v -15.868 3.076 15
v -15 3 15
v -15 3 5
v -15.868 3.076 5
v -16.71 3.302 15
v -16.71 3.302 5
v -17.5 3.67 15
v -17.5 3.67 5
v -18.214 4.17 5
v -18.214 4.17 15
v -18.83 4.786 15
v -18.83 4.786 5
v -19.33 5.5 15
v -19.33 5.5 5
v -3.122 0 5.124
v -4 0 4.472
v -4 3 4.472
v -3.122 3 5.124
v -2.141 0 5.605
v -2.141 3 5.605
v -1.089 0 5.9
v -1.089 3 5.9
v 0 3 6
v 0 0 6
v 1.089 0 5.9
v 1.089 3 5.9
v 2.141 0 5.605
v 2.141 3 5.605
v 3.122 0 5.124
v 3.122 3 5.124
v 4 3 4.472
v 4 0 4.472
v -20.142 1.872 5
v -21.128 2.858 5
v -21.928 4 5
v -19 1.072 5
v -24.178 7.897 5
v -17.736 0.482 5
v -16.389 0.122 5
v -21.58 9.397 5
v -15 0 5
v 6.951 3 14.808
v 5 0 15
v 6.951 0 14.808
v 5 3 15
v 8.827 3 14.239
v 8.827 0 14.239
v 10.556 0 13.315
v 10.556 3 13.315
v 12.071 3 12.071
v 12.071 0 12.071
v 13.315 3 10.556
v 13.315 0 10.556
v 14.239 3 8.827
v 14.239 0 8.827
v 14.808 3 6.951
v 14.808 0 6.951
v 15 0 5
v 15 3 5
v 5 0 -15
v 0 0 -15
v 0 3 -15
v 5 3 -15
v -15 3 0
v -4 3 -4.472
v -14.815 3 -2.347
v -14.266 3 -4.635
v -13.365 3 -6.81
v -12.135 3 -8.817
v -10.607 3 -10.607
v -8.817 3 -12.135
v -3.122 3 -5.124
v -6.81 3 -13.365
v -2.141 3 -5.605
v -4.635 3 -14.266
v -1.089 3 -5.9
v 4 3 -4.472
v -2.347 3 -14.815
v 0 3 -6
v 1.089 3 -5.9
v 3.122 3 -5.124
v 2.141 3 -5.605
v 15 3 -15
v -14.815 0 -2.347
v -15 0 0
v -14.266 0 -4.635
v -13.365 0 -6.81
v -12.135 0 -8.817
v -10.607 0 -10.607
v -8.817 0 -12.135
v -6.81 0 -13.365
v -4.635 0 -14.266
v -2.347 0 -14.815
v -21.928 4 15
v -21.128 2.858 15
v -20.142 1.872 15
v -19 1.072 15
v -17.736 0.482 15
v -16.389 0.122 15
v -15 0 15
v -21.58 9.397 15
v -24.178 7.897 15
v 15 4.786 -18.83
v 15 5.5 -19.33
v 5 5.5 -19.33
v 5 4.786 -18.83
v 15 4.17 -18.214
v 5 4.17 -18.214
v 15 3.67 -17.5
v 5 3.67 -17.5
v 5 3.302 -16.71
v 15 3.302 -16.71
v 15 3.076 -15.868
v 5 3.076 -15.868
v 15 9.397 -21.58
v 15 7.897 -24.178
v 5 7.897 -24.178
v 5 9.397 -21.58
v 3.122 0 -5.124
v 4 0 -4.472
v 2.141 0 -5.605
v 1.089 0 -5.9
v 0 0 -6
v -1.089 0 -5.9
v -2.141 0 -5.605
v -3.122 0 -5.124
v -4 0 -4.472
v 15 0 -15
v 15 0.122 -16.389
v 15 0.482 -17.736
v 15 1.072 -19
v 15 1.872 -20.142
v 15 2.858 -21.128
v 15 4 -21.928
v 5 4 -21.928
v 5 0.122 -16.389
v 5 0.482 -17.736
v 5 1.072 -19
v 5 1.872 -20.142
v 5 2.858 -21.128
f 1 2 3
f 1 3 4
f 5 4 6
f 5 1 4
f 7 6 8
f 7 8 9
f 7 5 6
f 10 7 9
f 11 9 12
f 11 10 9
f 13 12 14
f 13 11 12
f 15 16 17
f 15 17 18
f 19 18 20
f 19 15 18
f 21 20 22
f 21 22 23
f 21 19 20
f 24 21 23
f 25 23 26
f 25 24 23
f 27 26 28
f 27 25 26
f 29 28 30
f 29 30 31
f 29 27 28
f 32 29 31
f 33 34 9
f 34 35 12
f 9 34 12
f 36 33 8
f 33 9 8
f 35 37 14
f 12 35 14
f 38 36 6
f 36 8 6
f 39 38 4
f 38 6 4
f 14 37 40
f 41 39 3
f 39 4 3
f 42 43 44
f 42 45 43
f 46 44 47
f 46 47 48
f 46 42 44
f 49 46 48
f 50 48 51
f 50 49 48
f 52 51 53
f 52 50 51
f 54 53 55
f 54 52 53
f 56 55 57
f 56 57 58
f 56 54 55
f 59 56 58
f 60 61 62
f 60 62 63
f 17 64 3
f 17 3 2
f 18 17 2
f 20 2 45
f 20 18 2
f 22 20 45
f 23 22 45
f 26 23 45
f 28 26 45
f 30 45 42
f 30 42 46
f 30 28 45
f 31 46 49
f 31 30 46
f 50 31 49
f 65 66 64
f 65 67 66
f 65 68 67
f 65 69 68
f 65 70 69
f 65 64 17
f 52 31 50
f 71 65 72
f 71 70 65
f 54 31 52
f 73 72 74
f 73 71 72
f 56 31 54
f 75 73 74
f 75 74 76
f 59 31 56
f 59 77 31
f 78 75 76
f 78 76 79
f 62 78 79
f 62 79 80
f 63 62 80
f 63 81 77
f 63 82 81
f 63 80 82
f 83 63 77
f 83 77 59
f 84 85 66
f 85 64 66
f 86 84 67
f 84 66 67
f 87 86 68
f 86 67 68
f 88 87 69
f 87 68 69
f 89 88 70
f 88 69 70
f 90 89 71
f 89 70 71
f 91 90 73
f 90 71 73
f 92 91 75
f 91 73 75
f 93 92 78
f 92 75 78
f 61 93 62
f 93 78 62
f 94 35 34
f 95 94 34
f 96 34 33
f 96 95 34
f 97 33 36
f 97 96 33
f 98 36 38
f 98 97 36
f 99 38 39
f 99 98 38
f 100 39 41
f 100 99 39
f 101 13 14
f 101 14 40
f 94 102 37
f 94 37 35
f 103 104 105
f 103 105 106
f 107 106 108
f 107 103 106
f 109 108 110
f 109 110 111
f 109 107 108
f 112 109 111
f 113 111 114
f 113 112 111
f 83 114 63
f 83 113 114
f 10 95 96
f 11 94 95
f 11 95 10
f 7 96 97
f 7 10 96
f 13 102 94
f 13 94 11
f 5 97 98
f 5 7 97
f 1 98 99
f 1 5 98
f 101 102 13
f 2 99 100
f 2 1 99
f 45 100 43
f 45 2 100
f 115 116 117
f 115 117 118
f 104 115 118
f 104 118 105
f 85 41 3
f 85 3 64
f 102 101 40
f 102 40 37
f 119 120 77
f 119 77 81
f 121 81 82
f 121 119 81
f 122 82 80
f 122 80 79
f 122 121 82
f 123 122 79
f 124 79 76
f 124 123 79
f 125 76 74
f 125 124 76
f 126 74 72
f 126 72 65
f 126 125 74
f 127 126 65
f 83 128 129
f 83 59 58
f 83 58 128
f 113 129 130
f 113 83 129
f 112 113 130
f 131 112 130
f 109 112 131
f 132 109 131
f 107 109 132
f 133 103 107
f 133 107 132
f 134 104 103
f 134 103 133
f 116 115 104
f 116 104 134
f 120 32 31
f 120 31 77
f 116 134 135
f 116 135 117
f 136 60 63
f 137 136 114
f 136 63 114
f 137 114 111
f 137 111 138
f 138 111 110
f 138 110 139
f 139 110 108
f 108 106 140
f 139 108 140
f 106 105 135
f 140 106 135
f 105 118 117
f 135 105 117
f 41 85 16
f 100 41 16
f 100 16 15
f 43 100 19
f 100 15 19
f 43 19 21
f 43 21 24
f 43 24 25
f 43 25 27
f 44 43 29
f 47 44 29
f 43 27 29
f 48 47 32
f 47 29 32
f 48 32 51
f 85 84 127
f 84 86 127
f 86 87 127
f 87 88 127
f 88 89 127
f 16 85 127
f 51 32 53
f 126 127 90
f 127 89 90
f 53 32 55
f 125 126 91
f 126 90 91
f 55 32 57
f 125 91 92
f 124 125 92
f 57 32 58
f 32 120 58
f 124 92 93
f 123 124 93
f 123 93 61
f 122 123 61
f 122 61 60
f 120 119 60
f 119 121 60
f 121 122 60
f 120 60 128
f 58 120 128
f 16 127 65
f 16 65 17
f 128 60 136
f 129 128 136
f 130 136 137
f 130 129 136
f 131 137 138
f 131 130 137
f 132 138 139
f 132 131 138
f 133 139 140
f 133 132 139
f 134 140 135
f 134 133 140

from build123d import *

# Parameters (mm, degrees)
SKETCH1_W           = 30
SKETCH1_H           = 30
BOSS_EXTRUDE1_DEPTH = 3
BOSS_EXTRUDE2_DEPTH = 10
FILLET1_R           = 15
FILLET2_R           = 10
BOSS_EXTRUDE3_DEPTH = 10
CUT_EXTRUDE1_DEPTH  = 3


with BuildPart() as part:
    # Sketch1 → Boss-Extrude1 (new body)
    with BuildSketch(Plane(origin=(0, 0, 0), x_dir=(1, 0, 0), z_dir=(0, 1, 0))):
        Rectangle(SKETCH1_W, SKETCH1_H)
    extrude(amount=BOSS_EXTRUDE1_DEPTH)

    # Sketch2 → Boss-Extrude2 (add)
    with BuildSketch(Plane.XY.offset(15)):
        with BuildLine():
            Line((-21.580127019, 9.397114317), (-24.17820323, 7.897114317))
            Line((-24.17820323, 7.897114317), (-21.92820323, 4))
            ThreePointArc((-21.92820323, 4), (-19, 1.07179677), (-15, 0))
            Line((-15, 0), (-15, 3))
            ThreePointArc((-15, 3), (-17.5, 3.669872981), (-19.330127019, 5.5))
            Line((-19.330127019, 5.5), (-21.580127019, 9.397114317))
        make_face()
    extrude(amount=-BOSS_EXTRUDE2_DEPTH)

    # Fillet1
    fillet1_edges = [part.edges().sort_by_distance(p)[0] for p in [
        (-15, 1.5, -15),
    ]]
    fillet(fillet1_edges, radius=FILLET1_R)

    # Fillet2
    fillet2_edges = [part.edges().sort_by_distance(p)[0] for p in [
        (15, 1.5, 15),
    ]]
    fillet(fillet2_edges, radius=FILLET2_R)

    # Sketch3 → Boss-Extrude3 (add)
    with BuildSketch(Plane(origin=(15, 0, 0), x_dir=(0, 0, -1), z_dir=(1, 0, 0))):
        with BuildLine():
            Line((15, 3), (15, 0))
            ThreePointArc((15, 0), (19, 1.07179677), (21.92820323, 4))
            Line((21.92820323, 4), (24.17820323, 7.897114317))
            Line((24.17820323, 7.897114317), (21.580127019, 9.397114317))
            Line((21.580127019, 9.397114317), (19.330127019, 5.5))
            ThreePointArc((19.330127019, 5.5), (17.5, 3.669872981), (15, 3))
        make_face()
    extrude(amount=-BOSS_EXTRUDE3_DEPTH)

    # Sketch4 → Cut-Extrude1 (cut)
    with BuildSketch(Plane.XZ):
        with BuildLine():
            Line((-4, -4.472135955), (-4, 4.472135955))
            ThreePointArc((-4, 4.472135955), (0, 6), (4, 4.472135955))
            Line((4, 4.472135955), (4, -4.472135955))
            ThreePointArc((4, -4.472135955), (0, -6), (-4, -4.472135955))
        make_face()
    extrude(amount=-CUT_EXTRUDE1_DEPTH, mode=Mode.SUBTRACT)


solid = part.part
